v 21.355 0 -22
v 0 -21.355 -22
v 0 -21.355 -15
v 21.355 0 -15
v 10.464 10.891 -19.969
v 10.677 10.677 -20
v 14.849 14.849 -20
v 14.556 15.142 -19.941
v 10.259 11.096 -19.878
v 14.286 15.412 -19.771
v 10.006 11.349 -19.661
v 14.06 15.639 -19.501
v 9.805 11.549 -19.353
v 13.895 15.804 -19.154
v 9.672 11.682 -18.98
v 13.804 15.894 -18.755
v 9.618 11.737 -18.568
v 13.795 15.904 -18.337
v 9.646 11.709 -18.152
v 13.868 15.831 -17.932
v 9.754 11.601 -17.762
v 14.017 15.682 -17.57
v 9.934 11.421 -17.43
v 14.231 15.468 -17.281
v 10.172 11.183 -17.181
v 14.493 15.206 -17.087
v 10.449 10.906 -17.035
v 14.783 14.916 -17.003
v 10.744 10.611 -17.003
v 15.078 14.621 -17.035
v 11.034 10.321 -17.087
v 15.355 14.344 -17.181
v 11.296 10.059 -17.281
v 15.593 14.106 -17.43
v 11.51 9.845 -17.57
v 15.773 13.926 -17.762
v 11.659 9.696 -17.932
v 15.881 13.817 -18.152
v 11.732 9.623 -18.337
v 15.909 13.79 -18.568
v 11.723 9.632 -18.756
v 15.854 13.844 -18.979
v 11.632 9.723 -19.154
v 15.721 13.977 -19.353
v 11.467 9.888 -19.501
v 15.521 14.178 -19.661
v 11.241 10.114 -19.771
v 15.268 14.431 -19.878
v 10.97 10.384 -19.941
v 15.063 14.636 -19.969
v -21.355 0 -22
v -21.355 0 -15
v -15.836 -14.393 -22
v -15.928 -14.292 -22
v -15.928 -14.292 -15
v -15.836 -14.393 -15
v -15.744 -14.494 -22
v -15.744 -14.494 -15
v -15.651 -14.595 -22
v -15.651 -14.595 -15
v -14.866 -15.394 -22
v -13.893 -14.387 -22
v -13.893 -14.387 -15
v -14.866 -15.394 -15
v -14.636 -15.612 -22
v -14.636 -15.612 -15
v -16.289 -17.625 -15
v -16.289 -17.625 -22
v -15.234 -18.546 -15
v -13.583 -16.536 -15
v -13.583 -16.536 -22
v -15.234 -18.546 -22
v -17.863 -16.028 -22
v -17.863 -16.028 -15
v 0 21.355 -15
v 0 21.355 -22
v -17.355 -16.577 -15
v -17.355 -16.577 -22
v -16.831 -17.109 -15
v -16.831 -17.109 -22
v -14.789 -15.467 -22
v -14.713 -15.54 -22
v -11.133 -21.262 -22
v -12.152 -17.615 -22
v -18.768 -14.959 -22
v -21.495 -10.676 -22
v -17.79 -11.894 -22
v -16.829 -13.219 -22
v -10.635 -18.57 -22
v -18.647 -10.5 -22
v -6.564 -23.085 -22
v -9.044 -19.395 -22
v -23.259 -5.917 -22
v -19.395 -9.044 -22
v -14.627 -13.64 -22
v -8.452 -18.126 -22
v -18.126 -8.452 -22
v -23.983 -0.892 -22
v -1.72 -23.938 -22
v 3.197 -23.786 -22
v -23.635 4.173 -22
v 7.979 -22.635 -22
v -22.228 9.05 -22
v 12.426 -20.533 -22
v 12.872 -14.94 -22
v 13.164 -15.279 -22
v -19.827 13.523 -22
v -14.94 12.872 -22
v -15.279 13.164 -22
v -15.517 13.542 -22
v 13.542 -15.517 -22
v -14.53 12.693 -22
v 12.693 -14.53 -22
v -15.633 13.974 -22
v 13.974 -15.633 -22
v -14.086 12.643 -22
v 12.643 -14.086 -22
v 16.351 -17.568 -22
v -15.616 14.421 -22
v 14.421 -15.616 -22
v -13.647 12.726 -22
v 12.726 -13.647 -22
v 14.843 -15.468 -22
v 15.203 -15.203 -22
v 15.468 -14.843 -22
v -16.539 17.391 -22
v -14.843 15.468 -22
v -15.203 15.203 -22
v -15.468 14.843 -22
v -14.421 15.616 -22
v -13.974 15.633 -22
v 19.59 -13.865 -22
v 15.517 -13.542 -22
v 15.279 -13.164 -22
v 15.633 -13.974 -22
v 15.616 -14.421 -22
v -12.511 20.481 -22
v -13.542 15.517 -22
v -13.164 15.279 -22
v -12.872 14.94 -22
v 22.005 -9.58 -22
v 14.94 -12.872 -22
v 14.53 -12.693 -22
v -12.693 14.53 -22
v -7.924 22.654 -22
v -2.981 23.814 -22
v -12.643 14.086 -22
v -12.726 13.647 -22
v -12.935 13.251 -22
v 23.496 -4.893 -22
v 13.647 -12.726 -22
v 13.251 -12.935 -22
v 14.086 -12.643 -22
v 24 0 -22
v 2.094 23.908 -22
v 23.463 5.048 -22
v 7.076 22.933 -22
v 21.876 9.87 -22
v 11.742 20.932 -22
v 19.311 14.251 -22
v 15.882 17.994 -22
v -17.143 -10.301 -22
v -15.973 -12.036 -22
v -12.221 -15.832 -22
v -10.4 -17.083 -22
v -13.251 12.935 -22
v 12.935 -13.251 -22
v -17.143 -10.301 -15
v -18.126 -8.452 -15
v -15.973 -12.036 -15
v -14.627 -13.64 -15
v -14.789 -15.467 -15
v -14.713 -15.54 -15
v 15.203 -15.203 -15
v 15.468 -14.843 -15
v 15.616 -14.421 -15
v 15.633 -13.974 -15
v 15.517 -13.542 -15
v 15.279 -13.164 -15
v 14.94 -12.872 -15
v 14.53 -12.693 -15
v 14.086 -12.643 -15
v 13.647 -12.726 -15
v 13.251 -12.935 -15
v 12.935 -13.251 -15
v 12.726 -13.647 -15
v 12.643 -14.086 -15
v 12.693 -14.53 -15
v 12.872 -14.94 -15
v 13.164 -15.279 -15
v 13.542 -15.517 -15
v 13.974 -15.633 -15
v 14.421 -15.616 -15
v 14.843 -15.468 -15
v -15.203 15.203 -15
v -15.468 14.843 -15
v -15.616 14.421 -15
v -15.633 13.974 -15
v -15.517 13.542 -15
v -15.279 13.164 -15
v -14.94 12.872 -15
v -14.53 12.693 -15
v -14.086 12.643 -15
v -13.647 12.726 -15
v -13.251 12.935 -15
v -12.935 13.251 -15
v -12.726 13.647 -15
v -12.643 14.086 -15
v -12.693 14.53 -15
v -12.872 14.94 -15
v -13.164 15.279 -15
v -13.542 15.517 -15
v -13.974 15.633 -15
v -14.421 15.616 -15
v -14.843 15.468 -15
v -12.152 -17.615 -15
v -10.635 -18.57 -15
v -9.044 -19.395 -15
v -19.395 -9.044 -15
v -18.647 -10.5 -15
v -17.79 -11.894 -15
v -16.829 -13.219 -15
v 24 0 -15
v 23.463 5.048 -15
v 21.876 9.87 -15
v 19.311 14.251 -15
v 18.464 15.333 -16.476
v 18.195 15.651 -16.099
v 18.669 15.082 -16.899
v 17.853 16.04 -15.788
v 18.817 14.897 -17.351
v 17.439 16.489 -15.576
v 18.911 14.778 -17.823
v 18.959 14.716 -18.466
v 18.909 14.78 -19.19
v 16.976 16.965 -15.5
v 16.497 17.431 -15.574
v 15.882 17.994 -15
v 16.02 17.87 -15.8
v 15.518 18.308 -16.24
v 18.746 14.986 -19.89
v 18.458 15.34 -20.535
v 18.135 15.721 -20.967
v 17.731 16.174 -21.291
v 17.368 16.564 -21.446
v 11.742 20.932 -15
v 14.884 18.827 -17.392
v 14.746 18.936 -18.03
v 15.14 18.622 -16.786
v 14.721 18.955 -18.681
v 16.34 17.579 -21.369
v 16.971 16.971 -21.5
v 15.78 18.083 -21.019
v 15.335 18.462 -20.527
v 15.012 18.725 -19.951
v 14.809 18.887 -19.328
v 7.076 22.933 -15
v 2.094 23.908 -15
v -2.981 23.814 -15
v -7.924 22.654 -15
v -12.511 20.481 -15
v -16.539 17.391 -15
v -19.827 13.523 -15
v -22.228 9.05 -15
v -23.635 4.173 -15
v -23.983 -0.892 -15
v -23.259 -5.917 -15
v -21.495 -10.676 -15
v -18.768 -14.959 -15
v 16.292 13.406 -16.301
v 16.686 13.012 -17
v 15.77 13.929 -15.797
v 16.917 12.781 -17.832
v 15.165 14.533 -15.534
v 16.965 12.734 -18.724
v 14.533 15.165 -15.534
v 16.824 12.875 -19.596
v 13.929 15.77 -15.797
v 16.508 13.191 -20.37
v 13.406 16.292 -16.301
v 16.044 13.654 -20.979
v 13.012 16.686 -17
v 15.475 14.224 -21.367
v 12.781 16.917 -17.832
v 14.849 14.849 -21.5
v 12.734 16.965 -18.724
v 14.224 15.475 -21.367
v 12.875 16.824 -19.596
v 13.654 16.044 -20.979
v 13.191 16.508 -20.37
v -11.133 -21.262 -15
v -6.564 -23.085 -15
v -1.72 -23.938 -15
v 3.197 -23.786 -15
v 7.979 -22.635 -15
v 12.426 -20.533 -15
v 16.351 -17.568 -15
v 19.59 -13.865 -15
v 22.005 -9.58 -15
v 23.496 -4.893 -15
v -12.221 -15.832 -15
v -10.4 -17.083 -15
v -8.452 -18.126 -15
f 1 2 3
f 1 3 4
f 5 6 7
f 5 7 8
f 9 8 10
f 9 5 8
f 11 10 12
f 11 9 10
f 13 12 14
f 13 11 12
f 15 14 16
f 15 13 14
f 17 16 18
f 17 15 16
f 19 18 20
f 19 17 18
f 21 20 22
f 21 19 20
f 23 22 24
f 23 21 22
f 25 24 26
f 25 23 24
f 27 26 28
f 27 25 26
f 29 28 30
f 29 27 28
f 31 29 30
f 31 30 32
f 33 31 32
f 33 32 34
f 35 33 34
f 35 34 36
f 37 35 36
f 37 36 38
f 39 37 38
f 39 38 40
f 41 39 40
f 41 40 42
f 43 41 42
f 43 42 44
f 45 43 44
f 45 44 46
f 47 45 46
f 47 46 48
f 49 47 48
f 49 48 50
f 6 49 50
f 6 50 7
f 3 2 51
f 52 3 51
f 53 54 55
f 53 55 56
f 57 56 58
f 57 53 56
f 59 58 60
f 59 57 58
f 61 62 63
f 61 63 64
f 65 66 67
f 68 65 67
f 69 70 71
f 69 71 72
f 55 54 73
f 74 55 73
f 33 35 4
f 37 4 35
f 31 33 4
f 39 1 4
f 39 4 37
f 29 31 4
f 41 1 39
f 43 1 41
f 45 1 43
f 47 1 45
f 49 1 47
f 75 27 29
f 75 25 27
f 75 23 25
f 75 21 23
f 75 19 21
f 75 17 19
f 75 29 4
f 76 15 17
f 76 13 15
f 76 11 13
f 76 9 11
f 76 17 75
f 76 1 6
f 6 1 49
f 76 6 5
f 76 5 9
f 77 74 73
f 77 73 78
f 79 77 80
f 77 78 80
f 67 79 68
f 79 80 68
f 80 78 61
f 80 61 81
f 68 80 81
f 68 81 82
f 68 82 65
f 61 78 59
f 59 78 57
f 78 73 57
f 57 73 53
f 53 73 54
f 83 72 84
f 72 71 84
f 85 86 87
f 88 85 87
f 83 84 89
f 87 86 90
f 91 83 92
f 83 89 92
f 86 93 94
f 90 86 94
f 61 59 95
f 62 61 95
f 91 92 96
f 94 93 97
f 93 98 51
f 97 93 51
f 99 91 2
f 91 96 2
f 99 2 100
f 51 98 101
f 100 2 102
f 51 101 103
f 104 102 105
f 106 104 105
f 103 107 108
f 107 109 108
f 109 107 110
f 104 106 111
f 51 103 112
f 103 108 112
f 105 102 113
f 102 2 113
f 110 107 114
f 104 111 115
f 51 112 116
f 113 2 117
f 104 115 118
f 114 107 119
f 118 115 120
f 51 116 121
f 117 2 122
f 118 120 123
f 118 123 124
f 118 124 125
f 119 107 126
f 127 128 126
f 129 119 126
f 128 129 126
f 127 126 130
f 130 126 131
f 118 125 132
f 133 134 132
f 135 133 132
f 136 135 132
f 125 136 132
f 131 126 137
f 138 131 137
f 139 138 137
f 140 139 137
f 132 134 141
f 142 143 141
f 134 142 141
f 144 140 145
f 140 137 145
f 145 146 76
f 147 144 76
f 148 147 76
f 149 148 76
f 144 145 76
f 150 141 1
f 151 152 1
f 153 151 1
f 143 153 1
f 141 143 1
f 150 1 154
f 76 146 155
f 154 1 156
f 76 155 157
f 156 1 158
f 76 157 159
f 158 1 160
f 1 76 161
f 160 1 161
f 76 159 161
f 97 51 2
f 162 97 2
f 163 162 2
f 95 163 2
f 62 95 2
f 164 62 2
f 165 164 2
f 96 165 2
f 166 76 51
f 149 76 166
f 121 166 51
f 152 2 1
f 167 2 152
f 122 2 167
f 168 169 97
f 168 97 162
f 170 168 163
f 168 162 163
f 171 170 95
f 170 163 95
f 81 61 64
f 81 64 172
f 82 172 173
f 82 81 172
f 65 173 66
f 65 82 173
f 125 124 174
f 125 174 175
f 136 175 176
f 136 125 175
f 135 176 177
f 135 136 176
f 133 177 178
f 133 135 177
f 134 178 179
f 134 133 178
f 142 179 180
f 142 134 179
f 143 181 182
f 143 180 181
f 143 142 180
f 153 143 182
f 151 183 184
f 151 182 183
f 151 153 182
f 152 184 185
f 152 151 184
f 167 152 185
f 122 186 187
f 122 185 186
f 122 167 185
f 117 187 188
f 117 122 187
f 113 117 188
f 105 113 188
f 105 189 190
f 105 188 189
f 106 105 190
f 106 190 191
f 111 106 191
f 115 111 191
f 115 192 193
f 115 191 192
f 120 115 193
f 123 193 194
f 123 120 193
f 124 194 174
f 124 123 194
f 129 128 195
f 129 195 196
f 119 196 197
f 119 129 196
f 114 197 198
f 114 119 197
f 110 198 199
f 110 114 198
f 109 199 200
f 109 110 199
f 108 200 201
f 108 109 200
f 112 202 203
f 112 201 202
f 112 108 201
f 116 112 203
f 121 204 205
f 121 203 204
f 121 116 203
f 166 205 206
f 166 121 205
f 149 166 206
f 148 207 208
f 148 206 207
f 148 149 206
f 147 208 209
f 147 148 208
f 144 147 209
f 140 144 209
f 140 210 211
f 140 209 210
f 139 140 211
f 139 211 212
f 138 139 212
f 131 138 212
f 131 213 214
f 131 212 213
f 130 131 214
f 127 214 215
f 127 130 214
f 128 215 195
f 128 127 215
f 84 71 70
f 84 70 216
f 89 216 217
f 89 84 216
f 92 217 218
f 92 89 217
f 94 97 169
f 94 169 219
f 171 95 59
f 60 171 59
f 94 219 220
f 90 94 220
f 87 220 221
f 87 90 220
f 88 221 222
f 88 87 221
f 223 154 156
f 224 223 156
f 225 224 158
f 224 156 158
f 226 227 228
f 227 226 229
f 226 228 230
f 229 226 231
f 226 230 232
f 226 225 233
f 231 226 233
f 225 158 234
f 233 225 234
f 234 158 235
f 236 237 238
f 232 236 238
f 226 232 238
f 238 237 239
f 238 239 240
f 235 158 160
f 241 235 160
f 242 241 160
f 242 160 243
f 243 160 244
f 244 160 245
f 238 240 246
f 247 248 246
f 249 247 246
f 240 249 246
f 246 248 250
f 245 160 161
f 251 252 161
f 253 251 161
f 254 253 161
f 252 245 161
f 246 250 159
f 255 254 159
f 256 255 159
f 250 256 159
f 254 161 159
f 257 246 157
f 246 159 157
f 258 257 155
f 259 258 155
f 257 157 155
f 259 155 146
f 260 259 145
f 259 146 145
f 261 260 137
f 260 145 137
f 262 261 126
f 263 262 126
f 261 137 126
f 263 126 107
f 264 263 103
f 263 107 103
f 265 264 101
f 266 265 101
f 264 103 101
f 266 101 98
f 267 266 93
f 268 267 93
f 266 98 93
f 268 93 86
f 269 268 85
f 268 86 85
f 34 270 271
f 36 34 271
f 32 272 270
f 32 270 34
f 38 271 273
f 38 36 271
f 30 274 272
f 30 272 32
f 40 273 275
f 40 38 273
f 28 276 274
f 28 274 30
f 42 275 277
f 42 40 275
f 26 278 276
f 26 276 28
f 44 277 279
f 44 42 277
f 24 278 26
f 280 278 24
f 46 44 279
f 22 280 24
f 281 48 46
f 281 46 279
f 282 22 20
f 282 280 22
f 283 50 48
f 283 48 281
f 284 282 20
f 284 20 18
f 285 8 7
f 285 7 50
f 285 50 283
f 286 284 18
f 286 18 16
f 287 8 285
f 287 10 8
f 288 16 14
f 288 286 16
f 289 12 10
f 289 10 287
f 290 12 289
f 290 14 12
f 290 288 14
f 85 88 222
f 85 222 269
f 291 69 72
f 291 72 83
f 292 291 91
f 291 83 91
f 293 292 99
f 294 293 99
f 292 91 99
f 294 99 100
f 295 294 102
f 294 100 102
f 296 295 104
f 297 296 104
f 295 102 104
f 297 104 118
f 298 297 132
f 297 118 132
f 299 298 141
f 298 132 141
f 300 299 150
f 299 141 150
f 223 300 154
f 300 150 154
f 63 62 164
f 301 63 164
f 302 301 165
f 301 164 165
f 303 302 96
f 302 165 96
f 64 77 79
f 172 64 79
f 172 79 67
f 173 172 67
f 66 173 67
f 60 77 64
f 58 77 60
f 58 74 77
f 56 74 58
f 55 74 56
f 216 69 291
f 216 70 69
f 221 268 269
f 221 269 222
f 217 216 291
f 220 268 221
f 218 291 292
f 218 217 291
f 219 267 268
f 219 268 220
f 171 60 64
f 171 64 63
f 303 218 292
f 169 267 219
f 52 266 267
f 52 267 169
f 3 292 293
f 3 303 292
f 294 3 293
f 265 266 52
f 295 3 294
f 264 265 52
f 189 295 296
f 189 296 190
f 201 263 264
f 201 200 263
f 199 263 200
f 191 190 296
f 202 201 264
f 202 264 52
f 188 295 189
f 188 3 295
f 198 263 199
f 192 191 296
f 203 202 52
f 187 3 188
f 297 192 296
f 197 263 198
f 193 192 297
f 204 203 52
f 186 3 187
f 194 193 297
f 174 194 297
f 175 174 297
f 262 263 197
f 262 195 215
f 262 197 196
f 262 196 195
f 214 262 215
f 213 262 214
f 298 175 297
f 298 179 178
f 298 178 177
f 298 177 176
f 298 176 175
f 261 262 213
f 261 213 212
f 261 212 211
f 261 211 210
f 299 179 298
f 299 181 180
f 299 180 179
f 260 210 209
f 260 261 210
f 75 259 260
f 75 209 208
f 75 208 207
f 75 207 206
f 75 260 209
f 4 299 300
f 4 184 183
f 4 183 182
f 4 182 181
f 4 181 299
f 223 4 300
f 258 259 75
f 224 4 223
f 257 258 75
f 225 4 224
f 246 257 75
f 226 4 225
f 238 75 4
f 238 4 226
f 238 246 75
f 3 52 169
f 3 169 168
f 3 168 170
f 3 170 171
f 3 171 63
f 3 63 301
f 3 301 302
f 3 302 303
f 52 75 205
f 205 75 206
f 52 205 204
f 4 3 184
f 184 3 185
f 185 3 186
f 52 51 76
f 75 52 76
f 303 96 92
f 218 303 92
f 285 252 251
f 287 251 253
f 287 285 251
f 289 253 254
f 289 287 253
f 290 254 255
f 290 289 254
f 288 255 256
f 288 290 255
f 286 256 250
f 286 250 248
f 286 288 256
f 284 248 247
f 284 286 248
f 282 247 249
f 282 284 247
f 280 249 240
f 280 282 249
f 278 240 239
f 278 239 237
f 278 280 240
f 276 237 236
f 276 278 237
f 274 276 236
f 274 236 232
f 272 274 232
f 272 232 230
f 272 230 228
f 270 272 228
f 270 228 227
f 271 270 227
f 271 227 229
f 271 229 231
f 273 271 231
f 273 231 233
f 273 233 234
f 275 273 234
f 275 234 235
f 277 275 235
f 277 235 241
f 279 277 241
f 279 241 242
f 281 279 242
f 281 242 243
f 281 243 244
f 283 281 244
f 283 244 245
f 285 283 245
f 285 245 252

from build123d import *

# Parameters (mm, degrees)
CYLINDER1831_R               = 1.5
CYLINDER1831_DEPTH           = 50
CYLINDER1831_ROLL_ANGLE      = -22.499828
CYLINDER1831_PITCH_ANGLE     = 89.998999
CYLINDER1831_PLACEMENT_ANGLE = 22.499828
CYLINDER1835_R               = 3
CYLINDER1835_DEPTH           = 10
CYLINDER1835_PITCH_ANGLE     = 90
CYLINDER1835_PLACEMENT_ANGLE = 45
CYLINDER1832_R               = 20
CYLINDER1832_DEPTH           = 7
BOX735_W                     = 1.4
BOX735_H                     = 60
BOX735_DEPTH                 = 7
BOX735_PLACEMENT_ANGLE       = 5.7
BOX734_W                     = 1.4
BOX734_H                     = 60
BOX734_DEPTH                 = 7
BOX734_PLACEMENT_ANGLE       = 3
CUT548_PLACEMENT_ANGLE       = 134.9
BOX738_W                     = 60
BOX738_H                     = 60
BOX738_DEPTH                 = 7
BOX738_PLACEMENT_ANGLE       = 1
BOX733_W                     = 60
BOX733_H                     = 60
BOX733_DEPTH                 = 7
BOX733_PLACEMENT_ANGLE       = 2
BOX739_W                     = 120
BOX739_H                     = 60
BOX739_DEPTH                 = 7
TUBE094_R                    = 21.4
TUBE094_R_2                  = 20
TUBE094_DEPTH                = 7
BOX732_W                     = 60
BOX732_H                     = 60
BOX732_DEPTH                 = 7
BOX732_PLACEMENT_ANGLE       = 20
BOX731_W                     = 60
BOX731_H                     = 60
BOX731_DEPTH                 = 7
BOX731_PLACEMENT_ANGLE       = 20
BOX737_W                     = 120
BOX737_H                     = 60
BOX737_DEPTH                 = 7
TUBE093_R                    = 21.4
TUBE093_R_2                  = 20
TUBE093_DEPTH                = 7
CUT552_PLACEMENT_ANGLE       = 135
CYLINDER1834_R               = 1.5
CYLINDER1834_DEPTH           = 20
CYLINDER1834_PLACEMENT_ANGLE = 135
CYLINDER1833_R               = 1.5
CYLINDER1833_DEPTH           = 20
CYLINDER1833_PLACEMENT_ANGLE = 45
BOX736_W                     = 30.2
BOX736_H                     = 30.2
BOX736_DEPTH                 = 100
BOX736_PLACEMENT_ANGLE       = 45
CYLINDER1836_R               = 24
CYLINDER1836_DEPTH           = 7


with BuildPart() as v_lec1831:
    # Cylinder1831 → Cylinder1831 (new body)
    with BuildSketch(Plane.XY):
        Circle(CYLINDER1831_R)
    extrude(amount=CYLINDER1831_DEPTH)


with BuildPart() as v_lec1831_1:
    # Cylinder1831 roll: moved
    add(v_lec1831.part.rotate(Axis((0, 0, 0), (1, 0, 0)), CYLINDER1831_ROLL_ANGLE))


with BuildPart() as v_lec1831_2:
    # Cylinder1831 pitch: moved
    add(v_lec1831_1.part.rotate(Axis((0, 0, 0), (0, 1, 0)), CYLINDER1831_PITCH_ANGLE))


with BuildPart() as v_lec1831_3:
    # Cylinder1831 placement: moved
    add(v_lec1831_2.part.moved(Location((0, 0, -18.5))).rotate(Axis((0, 0, -18.5), (0, 0, 1)), CYLINDER1831_PLACEMENT_ANGLE))


with BuildPart() as v_lec1835:
    # Cylinder1835 → Cylinder1835 (new body)
    with BuildSketch(Plane.XY):
        Circle(CYLINDER1835_R)
    extrude(amount=CYLINDER1835_DEPTH)


with BuildPart() as v_lec1835_1:
    # Cylinder1835 pitch: moved
    add(v_lec1835.part.rotate(Axis((0, 0, 0), (0, 1, 0)), CYLINDER1835_PITCH_ANGLE))


with BuildPart() as v_lec1835_2:
    # Cylinder1835 placement: moved
    add(v_lec1835_1.part.moved(Location((14.849242, 14.849242, -18.5))).rotate(Axis((14.849242, 14.849242, -18.5), (0, 0, 1)), CYLINDER1835_PLACEMENT_ANGLE))


with BuildPart() as v_lec1832:
    # Cylinder1832 → Cylinder1832 (new body)
    with BuildSketch(Plane.XY.offset(-22)):
        Circle(CYLINDER1832_R)
    extrude(amount=CYLINDER1832_DEPTH)


with BuildPart() as krychle735:
    # Box735 → Box735 (new body)
    with BuildSketch(Plane.XY):
        with Locations((0.7, 30)):
            Rectangle(BOX735_W, BOX735_H)
    extrude(amount=BOX735_DEPTH)


with BuildPart() as krychle735_1:
    # Box735 placement: moved
    add(krychle735.part.moved(Location((0, 0, -22))).rotate(Axis((0, 0, -22), (0, 0, 1)), BOX735_PLACEMENT_ANGLE))


with BuildPart() as cut548:
    # Box734 → Box734 (new body)
    with BuildSketch(Plane.XY):
        with Locations((0.7, 30)):
            Rectangle(BOX734_W, BOX734_H)
    extrude(amount=BOX734_DEPTH)


with BuildPart() as cut548_1:
    # Box734 placement: moved
    add(cut548.part.moved(Location((0, 0, -22))).rotate(Axis((0, 0, -22), (0, 0, -1)), BOX734_PLACEMENT_ANGLE))

    # Compound905: union Krychle735
    add(krychle735_1.part)

    # Cut548: cut Válec1832
    add(v_lec1832.part, mode=Mode.SUBTRACT)


with BuildPart() as cut548_2:
    # Cut548 placement: moved
    add(cut548_1.part.rotate(Axis((0, 0, 0), (0, 0, 1)), CUT548_PLACEMENT_ANGLE))


with BuildPart() as krychle738:
    # Box738 → Box738 (new body)
    with BuildSketch(Plane.XY):
        with Locations((30, 30)):
            Rectangle(BOX738_W, BOX738_H)
    extrude(amount=BOX738_DEPTH)


with BuildPart() as krychle738_1:
    # Box738 placement: moved
    add(krychle738.part.moved(Location((-59.990862, -1.047144, -22))).rotate(Axis((-59.990862, -1.047144, -22), (0, 0, 1)), BOX738_PLACEMENT_ANGLE))


with BuildPart() as compound904:
    # Box733 → Box733 (new body)
    with BuildSketch(Plane.XY):
        with Locations((30, 30)):
            Rectangle(BOX733_W, BOX733_H)
    extrude(amount=BOX733_DEPTH)


with BuildPart() as compound904_1:
    # Box733 placement: moved
    add(compound904.part.moved(Location((0, 0, -22))).rotate(Axis((0, 0, -22), (0, 0, -1)), BOX733_PLACEMENT_ANGLE))

    # Compound904: union Krychle738
    add(krychle738_1.part)


with BuildPart() as krychle739:
    # Box739 → Box739 (new body)
    with BuildSketch(Plane(origin=(-60, -60, -22), x_dir=(1, 0, 0), z_dir=(0, 0, 1))):
        with Locations((60, 30)):
            Rectangle(BOX739_W, BOX739_H)
    extrude(amount=BOX739_DEPTH)


with BuildPart() as cut554:
    # Tube094 → Tube094 (new body)
    with BuildSketch(Plane.XY.offset(-22)):
        Circle(TUBE094_R)
        Circle(TUBE094_R_2, mode=Mode.SUBTRACT)
    extrude(amount=TUBE094_DEPTH)

    # Cut555: cut Krychle739
    add(krychle739.part, mode=Mode.SUBTRACT)

    # Cut554: cut Compound904
    add(compound904_1.part, mode=Mode.SUBTRACT)


with BuildPart() as cut554_1:
    # Cut554 placement: moved
    add(cut554.part.moved(Location((0, 0, -7))))


with BuildPart() as krychle732:
    # Box732 → Box732 (new body)
    with BuildSketch(Plane.XY):
        with Locations((30, 30)):
            Rectangle(BOX732_W, BOX732_H)
    extrude(amount=BOX732_DEPTH)


with BuildPart() as krychle732_1:
    # Box732 placement: moved
    add(krychle732.part.moved(Location((-56.381557, -20.521209, -22))).rotate(Axis((-56.381557, -20.521209, -22), (0, 0, 1)), BOX732_PLACEMENT_ANGLE))


with BuildPart() as compound907:
    # Box731 → Box731 (new body)
    with BuildSketch(Plane.XY):
        with Locations((30, 30)):
            Rectangle(BOX731_W, BOX731_H)
    extrude(amount=BOX731_DEPTH)


with BuildPart() as compound907_1:
    # Box731 placement: moved
    add(compound907.part.moved(Location((0, 0, -22))).rotate(Axis((0, 0, -22), (0, 0, -1)), BOX731_PLACEMENT_ANGLE))

    # Compound907: union Krychle732
    add(krychle732_1.part)


with BuildPart() as krychle737:
    # Box737 → Box737 (new body)
    with BuildSketch(Plane(origin=(-60, -60, -22), x_dir=(1, 0, 0), z_dir=(0, 0, 1))):
        with Locations((60, 30)):
            Rectangle(BOX737_W, BOX737_H)
    extrude(amount=BOX737_DEPTH)


with BuildPart() as cut552:
    # Tube093 → Tube093 (new body)
    with BuildSketch(Plane.XY.offset(-22)):
        Circle(TUBE093_R)
        Circle(TUBE093_R_2, mode=Mode.SUBTRACT)
    extrude(amount=TUBE093_DEPTH)

    # Cut559: cut Krychle737
    add(krychle737.part, mode=Mode.SUBTRACT)

    # Cut556: cut Compound907
    add(compound907_1.part, mode=Mode.SUBTRACT)


with BuildPart() as cut552_1:
    # Cut556 placement: moved
    add(cut552.part.moved(Location((0, 0, -7))))

    # Cut552: cut Cut554
    add(cut554_1.part, mode=Mode.SUBTRACT)


with BuildPart() as cut552_2:
    # Cut552 placement: moved
    add(cut552_1.part.moved(Location((0, 0, 7))).rotate(Axis((0, 0, 7), (0, 0, 1)), CUT552_PLACEMENT_ANGLE))


with BuildPart() as v_lec1834:
    # Cylinder1834 → Cylinder1834 (new body)
    with BuildSketch(Plane.XY):
        Circle(CYLINDER1834_R)
    extrude(amount=CYLINDER1834_DEPTH)


with BuildPart() as v_lec1834_1:
    # Cylinder1834 placement: moved
    add(v_lec1834.part.moved(Location((-14.142136, 14.142136, -30))).rotate(Axis((-14.142136, 14.142136, -30), (0, 0, 1)), CYLINDER1834_PLACEMENT_ANGLE))


with BuildPart() as compound906:
    # Cylinder1833 → Cylinder1833 (new body)
    with BuildSketch(Plane.XY):
        Circle(CYLINDER1833_R)
    extrude(amount=CYLINDER1833_DEPTH)


with BuildPart() as compound906_1:
    # Cylinder1833 placement: moved
    add(compound906.part.moved(Location((14.142136, -14.142136, -30))).rotate(Axis((14.142136, -14.142136, -30), (0, 0, -1)), CYLINDER1833_PLACEMENT_ANGLE))

    # Compound906: union Válec1834
    add(v_lec1834_1.part)


with BuildPart() as krychle736:
    # Box736 → Box736 (new body)
    with BuildSketch(Plane.XY):
        with Locations((15.1, 15.1)):
            Rectangle(BOX736_W, BOX736_H)
    extrude(amount=BOX736_DEPTH)


with BuildPart() as krychle736_1:
    # Box736 placement: moved
    add(krychle736.part.moved(Location((0, -21.354625, -30))).rotate(Axis((0, -21.354625, -30), (0, 0, 1)), BOX736_PLACEMENT_ANGLE))


with BuildPart() as cut551:
    # Cylinder1836 → Cylinder1836 (new body)
    with BuildSketch(Plane.XY.offset(-22)):
        Circle(CYLINDER1836_R)
    extrude(amount=CYLINDER1836_DEPTH)

    # Cut553: cut Krychle736
    add(krychle736_1.part, mode=Mode.SUBTRACT)

    # Cut558: cut Compound906
    add(compound906_1.part, mode=Mode.SUBTRACT)

    # Cut557: cut Cut552
    add(cut552_2.part, mode=Mode.SUBTRACT)

    # Cut549: cut Cut548
    add(cut548_2.part, mode=Mode.SUBTRACT)

    # Cut550: cut Válec1835
    add(v_lec1835_2.part, mode=Mode.SUBTRACT)

    # Cut551: cut Válec1831
    add(v_lec1831_3.part, mode=Mode.SUBTRACT)


solid = cut551.part
